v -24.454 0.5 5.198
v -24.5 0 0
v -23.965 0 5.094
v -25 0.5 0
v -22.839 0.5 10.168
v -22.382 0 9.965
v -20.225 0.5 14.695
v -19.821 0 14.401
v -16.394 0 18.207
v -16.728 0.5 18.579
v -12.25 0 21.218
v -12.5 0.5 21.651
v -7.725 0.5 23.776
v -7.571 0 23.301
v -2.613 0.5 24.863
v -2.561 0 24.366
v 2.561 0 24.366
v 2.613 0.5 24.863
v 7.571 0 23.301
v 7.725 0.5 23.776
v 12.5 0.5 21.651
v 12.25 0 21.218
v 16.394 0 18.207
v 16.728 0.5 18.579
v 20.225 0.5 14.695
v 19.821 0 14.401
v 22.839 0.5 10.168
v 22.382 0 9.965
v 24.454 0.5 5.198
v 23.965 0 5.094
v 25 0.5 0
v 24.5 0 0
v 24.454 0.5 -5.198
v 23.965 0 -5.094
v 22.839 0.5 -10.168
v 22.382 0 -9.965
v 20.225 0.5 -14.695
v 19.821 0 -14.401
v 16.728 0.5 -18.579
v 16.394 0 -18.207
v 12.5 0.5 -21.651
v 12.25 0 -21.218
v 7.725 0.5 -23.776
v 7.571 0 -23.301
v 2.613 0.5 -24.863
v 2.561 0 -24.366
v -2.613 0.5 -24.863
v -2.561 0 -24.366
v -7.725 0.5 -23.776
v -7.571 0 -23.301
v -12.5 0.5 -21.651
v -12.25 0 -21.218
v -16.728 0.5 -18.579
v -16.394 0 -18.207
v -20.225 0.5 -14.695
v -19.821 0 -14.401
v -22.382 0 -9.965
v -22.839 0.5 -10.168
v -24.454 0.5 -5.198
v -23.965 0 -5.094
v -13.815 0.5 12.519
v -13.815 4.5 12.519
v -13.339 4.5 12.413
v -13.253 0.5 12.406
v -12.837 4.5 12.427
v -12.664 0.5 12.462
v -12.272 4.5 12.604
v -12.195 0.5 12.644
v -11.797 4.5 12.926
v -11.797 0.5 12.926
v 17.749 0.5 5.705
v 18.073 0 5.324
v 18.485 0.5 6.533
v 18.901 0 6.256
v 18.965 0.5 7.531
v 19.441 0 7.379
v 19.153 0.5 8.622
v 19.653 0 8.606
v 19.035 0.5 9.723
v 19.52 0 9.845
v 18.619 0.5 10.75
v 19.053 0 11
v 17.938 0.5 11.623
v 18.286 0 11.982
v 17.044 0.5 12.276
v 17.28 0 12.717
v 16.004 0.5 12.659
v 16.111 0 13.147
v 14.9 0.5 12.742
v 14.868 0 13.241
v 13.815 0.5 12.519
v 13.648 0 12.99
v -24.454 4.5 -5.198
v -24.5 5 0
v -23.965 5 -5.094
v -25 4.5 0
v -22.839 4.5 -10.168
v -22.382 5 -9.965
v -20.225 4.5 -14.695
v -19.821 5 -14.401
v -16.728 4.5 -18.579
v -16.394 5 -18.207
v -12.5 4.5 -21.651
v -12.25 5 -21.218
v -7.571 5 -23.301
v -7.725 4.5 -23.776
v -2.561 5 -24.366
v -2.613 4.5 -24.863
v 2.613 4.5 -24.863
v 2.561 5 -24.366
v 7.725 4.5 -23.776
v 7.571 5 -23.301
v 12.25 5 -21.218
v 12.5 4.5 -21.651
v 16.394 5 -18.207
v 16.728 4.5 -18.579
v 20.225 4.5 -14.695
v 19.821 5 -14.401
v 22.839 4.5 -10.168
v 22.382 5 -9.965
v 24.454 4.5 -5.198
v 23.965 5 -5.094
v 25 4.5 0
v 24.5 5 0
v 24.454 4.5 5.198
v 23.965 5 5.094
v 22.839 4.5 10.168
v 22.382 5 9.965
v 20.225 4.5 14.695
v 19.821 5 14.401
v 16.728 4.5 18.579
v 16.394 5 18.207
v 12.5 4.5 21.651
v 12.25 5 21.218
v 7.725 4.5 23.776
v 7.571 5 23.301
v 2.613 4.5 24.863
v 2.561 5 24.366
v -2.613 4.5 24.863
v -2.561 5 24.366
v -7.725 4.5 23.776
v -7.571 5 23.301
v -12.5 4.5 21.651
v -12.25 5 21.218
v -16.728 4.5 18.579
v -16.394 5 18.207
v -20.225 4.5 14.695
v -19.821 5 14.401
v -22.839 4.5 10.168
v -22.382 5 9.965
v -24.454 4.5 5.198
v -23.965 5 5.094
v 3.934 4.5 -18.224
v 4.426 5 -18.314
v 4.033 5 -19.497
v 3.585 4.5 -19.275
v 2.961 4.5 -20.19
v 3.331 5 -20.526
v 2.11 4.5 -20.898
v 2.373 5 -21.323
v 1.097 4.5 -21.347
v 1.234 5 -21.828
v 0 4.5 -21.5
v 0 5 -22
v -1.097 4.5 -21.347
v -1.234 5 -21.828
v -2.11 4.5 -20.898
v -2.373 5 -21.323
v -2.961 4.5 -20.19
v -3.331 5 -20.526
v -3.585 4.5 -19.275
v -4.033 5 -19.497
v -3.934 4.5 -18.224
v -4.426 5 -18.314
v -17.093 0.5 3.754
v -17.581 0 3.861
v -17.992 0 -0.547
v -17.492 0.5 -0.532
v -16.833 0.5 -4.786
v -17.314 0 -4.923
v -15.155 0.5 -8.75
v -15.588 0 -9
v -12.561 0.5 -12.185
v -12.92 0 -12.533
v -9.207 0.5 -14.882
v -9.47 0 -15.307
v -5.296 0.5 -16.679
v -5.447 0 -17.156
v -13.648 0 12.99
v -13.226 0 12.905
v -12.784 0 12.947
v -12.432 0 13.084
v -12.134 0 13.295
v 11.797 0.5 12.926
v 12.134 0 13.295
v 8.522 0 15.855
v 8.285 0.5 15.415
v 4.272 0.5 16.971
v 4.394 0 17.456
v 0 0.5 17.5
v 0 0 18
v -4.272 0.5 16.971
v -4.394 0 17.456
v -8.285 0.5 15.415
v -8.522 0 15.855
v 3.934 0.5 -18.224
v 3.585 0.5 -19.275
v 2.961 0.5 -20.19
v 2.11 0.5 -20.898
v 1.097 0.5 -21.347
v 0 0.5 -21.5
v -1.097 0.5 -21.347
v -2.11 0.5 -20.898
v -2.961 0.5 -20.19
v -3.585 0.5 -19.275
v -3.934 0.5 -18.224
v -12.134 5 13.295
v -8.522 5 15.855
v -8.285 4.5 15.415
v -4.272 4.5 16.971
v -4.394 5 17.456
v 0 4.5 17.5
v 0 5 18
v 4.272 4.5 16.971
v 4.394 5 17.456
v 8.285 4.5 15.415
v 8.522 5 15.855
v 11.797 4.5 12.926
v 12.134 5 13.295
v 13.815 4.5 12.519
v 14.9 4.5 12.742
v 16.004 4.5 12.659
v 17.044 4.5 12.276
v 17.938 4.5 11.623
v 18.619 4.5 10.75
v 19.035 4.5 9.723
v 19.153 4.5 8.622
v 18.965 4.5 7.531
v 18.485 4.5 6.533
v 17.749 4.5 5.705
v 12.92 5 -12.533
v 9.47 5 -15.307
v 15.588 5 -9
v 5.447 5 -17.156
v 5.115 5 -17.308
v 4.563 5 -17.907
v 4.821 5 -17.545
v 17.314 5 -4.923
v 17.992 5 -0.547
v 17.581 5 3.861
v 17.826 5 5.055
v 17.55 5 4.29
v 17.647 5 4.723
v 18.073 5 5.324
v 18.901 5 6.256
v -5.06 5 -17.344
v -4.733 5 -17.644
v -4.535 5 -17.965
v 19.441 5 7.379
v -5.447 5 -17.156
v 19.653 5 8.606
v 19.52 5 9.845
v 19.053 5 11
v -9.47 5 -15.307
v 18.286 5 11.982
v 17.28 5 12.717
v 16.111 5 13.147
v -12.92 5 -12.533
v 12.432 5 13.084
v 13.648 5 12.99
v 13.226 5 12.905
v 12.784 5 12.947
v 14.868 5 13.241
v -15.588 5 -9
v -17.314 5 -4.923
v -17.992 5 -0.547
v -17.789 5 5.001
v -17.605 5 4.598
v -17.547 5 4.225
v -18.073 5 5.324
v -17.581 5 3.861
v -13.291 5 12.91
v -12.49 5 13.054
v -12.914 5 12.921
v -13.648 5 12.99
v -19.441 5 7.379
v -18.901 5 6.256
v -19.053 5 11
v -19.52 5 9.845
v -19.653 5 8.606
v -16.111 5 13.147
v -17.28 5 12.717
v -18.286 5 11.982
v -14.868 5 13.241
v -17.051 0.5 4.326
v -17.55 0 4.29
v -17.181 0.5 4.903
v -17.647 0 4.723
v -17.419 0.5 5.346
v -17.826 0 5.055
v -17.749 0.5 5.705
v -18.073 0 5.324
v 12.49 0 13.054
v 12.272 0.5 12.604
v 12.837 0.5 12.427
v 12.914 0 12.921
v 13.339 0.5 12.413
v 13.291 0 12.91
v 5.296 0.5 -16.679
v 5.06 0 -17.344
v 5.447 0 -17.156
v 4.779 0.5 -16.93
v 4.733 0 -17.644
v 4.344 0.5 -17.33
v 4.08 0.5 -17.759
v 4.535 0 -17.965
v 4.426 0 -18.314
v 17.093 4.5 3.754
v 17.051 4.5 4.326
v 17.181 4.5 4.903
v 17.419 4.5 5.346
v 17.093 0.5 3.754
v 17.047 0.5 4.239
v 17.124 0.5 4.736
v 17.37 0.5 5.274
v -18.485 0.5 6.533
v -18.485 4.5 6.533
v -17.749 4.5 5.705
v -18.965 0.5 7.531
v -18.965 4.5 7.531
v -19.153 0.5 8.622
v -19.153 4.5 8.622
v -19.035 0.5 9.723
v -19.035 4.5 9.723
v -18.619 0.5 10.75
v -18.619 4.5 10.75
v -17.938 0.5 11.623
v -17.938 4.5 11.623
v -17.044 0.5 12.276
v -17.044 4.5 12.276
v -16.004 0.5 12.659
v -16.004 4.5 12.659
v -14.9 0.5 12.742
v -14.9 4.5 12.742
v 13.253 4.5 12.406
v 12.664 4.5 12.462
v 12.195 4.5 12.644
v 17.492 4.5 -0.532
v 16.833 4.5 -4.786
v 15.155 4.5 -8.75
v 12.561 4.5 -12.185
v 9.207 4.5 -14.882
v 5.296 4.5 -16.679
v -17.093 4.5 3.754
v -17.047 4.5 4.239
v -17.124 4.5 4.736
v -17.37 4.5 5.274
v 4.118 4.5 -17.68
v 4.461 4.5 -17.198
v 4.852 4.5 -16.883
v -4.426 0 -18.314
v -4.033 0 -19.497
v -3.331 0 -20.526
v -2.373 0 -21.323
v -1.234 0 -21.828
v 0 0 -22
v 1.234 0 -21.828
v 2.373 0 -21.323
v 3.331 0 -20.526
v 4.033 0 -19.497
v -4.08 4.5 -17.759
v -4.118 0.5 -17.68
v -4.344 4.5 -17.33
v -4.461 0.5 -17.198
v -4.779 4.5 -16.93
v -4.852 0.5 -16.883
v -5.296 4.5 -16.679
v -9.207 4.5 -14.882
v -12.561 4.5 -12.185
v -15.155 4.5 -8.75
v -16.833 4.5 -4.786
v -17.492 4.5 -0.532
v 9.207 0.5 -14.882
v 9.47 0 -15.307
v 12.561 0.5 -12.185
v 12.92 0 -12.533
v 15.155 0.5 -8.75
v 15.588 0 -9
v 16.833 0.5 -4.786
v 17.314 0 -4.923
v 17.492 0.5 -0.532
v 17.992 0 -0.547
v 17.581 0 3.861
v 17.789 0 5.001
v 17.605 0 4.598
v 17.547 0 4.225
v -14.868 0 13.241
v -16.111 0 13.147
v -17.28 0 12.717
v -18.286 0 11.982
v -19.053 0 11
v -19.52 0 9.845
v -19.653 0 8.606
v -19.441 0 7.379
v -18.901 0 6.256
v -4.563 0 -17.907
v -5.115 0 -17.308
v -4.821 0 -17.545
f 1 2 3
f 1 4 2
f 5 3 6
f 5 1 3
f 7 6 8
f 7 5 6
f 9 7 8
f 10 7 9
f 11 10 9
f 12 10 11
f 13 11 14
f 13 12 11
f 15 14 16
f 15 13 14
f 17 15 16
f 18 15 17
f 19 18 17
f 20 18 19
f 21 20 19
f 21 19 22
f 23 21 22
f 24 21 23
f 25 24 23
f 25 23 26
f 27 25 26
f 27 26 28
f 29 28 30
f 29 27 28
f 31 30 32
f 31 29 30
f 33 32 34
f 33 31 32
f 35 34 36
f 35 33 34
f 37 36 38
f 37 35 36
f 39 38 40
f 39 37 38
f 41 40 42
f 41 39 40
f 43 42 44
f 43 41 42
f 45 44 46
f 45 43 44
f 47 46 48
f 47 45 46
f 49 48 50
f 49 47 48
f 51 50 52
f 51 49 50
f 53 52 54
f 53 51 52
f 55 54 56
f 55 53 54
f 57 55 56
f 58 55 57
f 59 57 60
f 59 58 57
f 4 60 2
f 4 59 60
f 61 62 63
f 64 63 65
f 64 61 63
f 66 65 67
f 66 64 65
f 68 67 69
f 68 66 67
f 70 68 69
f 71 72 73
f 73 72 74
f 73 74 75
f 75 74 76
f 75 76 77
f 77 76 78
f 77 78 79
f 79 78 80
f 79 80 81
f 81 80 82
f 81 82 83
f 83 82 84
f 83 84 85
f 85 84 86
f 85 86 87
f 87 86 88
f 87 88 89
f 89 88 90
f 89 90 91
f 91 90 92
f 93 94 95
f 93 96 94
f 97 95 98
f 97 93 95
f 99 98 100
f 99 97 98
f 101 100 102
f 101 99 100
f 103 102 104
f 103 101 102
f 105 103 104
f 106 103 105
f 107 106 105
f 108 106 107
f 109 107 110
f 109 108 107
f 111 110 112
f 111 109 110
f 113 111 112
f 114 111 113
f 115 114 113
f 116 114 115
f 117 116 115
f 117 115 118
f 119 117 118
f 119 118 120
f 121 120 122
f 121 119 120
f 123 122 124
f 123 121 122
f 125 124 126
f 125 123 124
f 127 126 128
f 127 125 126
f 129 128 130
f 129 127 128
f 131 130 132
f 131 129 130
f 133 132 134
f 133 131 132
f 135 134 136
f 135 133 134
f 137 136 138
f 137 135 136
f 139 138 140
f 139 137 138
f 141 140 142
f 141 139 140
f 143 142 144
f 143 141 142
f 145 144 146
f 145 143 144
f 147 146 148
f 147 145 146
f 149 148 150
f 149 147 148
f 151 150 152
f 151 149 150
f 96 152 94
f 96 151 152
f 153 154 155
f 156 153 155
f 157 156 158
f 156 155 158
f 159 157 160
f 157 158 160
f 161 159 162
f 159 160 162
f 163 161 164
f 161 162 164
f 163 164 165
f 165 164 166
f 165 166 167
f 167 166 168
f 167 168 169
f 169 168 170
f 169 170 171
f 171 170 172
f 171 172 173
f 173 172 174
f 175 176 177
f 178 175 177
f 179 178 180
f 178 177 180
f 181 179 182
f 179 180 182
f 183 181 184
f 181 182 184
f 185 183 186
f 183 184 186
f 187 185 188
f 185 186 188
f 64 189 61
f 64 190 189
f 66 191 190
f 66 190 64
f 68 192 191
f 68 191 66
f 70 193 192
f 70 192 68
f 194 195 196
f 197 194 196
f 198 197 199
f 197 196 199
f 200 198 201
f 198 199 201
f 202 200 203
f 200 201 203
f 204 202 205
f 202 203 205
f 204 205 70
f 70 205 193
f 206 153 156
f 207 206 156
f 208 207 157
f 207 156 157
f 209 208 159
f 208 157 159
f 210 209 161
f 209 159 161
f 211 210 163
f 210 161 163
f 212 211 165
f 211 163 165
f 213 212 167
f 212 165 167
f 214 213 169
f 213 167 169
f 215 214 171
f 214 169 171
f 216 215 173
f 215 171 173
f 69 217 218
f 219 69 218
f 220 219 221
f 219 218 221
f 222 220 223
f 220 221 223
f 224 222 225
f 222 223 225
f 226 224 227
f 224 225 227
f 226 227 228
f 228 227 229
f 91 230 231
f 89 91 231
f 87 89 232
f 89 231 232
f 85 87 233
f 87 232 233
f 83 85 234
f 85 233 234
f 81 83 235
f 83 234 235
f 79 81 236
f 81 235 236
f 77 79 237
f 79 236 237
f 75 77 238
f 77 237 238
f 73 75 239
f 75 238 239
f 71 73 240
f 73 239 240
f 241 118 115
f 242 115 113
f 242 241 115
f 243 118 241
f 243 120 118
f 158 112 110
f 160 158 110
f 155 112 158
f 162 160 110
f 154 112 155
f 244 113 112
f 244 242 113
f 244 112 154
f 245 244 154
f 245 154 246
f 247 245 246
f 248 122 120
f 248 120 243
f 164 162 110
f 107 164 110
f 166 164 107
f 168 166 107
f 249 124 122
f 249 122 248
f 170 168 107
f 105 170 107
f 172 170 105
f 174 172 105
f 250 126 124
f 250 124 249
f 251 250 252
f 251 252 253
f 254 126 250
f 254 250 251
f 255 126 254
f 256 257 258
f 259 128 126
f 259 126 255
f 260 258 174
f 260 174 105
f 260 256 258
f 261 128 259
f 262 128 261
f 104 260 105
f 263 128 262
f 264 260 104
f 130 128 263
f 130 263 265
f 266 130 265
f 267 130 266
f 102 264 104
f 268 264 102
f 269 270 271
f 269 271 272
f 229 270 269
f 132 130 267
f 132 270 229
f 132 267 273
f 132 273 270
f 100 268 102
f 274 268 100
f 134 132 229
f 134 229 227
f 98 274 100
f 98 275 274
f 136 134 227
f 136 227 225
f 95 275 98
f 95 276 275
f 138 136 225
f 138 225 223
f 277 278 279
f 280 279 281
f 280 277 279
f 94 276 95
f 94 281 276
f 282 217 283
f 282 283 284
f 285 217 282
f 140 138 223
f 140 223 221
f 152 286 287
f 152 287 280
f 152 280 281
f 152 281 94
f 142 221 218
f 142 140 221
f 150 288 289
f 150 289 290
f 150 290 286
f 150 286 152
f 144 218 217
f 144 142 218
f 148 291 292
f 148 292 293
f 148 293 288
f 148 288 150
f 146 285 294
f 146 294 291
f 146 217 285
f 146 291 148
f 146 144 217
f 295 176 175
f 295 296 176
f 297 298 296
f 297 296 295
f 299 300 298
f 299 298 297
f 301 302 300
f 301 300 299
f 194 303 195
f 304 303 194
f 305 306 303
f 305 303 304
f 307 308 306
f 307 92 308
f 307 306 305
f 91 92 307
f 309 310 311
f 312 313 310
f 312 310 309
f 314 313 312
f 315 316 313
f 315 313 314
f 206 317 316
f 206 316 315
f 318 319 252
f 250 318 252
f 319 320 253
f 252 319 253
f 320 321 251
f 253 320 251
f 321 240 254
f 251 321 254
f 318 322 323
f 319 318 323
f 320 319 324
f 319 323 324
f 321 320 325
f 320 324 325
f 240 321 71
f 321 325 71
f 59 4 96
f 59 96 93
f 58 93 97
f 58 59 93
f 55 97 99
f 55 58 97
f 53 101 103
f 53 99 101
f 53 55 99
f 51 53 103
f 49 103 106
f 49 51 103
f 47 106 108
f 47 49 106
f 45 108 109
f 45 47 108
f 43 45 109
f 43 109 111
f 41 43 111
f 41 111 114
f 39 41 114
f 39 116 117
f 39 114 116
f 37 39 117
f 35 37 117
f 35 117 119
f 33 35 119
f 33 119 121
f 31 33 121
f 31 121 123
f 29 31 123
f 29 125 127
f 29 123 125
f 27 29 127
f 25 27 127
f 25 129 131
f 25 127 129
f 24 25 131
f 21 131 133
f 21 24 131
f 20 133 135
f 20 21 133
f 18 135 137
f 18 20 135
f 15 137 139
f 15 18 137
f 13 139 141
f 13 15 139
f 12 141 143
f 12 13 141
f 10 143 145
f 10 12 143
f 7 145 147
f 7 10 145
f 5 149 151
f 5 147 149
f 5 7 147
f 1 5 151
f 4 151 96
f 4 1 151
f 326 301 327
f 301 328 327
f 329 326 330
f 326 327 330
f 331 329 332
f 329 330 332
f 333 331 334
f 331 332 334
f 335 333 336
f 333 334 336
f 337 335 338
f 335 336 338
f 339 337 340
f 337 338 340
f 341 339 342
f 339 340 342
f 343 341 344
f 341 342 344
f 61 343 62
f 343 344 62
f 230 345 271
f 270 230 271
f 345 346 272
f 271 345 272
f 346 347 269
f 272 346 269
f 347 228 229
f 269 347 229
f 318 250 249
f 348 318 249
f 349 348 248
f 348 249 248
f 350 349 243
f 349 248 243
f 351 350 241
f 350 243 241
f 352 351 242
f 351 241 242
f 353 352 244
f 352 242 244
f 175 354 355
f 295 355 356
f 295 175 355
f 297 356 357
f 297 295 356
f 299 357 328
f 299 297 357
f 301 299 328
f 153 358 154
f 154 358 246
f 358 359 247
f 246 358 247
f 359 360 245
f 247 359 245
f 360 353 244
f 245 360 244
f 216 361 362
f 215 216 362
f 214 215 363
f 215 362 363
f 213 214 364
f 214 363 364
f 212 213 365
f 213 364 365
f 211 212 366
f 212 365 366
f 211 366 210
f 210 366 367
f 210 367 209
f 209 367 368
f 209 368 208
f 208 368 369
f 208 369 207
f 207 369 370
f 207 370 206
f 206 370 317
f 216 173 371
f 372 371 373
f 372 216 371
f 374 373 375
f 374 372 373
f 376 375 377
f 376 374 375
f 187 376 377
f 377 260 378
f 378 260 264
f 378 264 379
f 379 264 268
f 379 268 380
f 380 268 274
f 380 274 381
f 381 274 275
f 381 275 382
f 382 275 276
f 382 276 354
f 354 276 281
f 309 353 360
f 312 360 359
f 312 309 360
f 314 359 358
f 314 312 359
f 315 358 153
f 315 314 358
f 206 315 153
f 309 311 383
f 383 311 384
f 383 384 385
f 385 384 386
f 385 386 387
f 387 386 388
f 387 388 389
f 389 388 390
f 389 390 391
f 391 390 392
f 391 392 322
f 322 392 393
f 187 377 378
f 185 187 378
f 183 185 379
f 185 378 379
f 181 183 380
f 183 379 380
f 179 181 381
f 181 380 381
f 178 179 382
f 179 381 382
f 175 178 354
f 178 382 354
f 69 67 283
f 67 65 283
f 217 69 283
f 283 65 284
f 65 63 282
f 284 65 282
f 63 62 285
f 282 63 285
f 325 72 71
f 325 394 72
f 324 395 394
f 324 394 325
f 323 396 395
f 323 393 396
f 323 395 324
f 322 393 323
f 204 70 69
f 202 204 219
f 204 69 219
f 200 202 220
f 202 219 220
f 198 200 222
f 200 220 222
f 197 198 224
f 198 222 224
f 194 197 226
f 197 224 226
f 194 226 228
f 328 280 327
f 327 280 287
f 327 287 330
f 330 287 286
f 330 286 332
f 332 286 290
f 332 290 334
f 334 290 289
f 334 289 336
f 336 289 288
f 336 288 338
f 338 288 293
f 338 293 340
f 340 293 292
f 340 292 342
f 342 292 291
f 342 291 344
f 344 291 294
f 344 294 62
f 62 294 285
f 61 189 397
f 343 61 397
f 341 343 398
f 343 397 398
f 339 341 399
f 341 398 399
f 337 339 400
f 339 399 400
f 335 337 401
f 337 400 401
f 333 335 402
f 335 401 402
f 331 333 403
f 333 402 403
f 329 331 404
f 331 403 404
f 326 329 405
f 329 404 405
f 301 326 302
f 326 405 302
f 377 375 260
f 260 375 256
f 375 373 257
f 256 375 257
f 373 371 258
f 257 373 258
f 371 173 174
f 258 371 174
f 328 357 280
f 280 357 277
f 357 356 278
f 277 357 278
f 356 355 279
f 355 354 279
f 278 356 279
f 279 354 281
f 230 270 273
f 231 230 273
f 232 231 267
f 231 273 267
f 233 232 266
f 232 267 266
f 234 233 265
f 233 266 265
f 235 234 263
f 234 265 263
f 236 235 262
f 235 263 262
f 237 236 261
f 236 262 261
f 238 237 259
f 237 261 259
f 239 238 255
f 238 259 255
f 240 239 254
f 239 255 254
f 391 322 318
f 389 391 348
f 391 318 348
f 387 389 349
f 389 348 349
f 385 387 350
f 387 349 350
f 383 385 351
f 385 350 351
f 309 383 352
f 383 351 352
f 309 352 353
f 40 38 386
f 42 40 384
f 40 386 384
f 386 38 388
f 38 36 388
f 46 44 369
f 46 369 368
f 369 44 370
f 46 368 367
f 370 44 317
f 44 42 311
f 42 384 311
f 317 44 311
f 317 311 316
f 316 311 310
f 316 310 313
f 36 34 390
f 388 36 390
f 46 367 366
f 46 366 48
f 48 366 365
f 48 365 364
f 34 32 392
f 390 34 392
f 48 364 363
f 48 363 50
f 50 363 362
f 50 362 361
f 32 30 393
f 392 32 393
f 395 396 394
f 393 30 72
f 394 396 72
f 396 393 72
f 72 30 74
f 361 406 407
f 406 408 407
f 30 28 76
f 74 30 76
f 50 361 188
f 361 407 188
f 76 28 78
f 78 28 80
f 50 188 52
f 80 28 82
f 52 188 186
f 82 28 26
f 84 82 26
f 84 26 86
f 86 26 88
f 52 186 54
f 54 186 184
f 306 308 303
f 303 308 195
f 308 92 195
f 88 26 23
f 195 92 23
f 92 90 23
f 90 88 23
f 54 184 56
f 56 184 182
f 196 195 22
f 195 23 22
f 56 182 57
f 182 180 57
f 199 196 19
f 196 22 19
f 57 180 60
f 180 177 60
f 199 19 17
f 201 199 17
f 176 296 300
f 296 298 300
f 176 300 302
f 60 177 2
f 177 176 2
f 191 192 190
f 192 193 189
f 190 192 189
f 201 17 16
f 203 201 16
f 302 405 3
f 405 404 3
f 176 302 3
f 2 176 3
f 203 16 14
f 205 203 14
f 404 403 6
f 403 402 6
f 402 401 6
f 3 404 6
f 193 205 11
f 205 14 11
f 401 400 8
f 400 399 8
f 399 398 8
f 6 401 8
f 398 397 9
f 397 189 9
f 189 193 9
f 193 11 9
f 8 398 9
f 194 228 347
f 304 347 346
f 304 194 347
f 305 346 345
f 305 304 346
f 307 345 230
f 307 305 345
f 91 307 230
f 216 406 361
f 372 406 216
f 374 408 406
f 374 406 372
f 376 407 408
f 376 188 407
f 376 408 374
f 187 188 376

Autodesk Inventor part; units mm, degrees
ref_plane "YZ Plane" through (0, 0, 0) normal (1, 0, 0) x (0, 1, 0)
ref_plane "XZ Plane" through (0, 0, 0) normal (0, 1, 0) x (-1, 0, 0)
ref_plane "XY Plane" through (0, 0, 0) normal (0, 0, 1) x (1, 0, 0)
sketch "スケッチ1" plane through (0, 0, 0) normal (0, 1, 0) x (-1, 0, 0)
  circle A0 centre (0, 0) radius 25
  dimension "d0" = 50
extrude "押し出し1" add sketch "スケッチ1" along normal blind 5
sketch "スケッチ4" plane through (0, 5, 0) normal (0, 1, 0) x (1, 0, 0)
  circle A0 centre (0, 0) radius 17.5
  dimension "d9" = 35
extrude "押し出し4" cut sketch "スケッチ4" against normal through all
sketch "スケッチ8" plane through (0, 5, 0) normal (0, 1, 0) x (1, 0, 0)
  circle A0 centre (0, 0) radius 17.5 projected
  circle A1 centre (0, 17.5) radius 4
  circle A2 centre (-15.1554, -8.75) radius 4
  circle A3 centre (15.1554, -8.75) radius 4
  point P0 (-12.7727, -11.9628)
  point P1 (-16.7464, -5.08)
  point P2 (12.7727, -11.9628)
  point P3 (16.7464, -5.08)
  point P4 (3.9738, 17.0429)
  point P5 (-3.9738, 17.0429)
  dimension "d43" = 8
  dimension "d46" = 360
extrude "押し出し8" cut sketch "スケッチ8" against normal through all contours A0 A1 | A3 A0 | A0 A2 picked at (-0.0763, 18.7972) picked at (16.3019, -9.3615) picked at (-16.2807, -9.3997)
fillet "フィレット2" radius 2 6 edges at (-16.7464, 2.5, 5.08) (-12.7727, 2.5, 11.9628) (3.9738, 2.5, -17.0429) (-3.9738, 2.5, -17.0429) (16.7464, 2.5, 5.08) (12.7727, 2.5, 11.9628)
chamfer "面取り2" distance 0.5 angle 45 26 edges at (25, 5, 0) (15.1554, 5, -8.75) (-15.1554, 5, -8.75) (0, 5, 17.5) (17.1506, 5, 4.8202) (12.7497, 5, 12.4427) (18.6195, 5, 10.75) (-17.1506, 5, 4.8202) (-12.7497, 5, 12.4427) (-18.6195, 5, 10.75) (4.4009, 5, -17.263) (-4.4009, 5, -17.263) (0, 5, -21.5) (-15.1554, 0, -8.75) (-17.1506, 0, 4.8202) (-12.7497, 0, 12.4427) (-18.6195, 0, 10.75) (15.1554, 0, -8.75) (0, 0, 17.5) (17.1506, 0, 4.8202) (12.7497, 0, 12.4427) (18.6195, 0, 10.75) (4.4009, 0, -17.263) (-4.4009, 0, -17.263) (0, 0, -21.5) (25, 0, 0)
properties part number "B_probe_bearing_clamp" material "PAEK 樹脂"
